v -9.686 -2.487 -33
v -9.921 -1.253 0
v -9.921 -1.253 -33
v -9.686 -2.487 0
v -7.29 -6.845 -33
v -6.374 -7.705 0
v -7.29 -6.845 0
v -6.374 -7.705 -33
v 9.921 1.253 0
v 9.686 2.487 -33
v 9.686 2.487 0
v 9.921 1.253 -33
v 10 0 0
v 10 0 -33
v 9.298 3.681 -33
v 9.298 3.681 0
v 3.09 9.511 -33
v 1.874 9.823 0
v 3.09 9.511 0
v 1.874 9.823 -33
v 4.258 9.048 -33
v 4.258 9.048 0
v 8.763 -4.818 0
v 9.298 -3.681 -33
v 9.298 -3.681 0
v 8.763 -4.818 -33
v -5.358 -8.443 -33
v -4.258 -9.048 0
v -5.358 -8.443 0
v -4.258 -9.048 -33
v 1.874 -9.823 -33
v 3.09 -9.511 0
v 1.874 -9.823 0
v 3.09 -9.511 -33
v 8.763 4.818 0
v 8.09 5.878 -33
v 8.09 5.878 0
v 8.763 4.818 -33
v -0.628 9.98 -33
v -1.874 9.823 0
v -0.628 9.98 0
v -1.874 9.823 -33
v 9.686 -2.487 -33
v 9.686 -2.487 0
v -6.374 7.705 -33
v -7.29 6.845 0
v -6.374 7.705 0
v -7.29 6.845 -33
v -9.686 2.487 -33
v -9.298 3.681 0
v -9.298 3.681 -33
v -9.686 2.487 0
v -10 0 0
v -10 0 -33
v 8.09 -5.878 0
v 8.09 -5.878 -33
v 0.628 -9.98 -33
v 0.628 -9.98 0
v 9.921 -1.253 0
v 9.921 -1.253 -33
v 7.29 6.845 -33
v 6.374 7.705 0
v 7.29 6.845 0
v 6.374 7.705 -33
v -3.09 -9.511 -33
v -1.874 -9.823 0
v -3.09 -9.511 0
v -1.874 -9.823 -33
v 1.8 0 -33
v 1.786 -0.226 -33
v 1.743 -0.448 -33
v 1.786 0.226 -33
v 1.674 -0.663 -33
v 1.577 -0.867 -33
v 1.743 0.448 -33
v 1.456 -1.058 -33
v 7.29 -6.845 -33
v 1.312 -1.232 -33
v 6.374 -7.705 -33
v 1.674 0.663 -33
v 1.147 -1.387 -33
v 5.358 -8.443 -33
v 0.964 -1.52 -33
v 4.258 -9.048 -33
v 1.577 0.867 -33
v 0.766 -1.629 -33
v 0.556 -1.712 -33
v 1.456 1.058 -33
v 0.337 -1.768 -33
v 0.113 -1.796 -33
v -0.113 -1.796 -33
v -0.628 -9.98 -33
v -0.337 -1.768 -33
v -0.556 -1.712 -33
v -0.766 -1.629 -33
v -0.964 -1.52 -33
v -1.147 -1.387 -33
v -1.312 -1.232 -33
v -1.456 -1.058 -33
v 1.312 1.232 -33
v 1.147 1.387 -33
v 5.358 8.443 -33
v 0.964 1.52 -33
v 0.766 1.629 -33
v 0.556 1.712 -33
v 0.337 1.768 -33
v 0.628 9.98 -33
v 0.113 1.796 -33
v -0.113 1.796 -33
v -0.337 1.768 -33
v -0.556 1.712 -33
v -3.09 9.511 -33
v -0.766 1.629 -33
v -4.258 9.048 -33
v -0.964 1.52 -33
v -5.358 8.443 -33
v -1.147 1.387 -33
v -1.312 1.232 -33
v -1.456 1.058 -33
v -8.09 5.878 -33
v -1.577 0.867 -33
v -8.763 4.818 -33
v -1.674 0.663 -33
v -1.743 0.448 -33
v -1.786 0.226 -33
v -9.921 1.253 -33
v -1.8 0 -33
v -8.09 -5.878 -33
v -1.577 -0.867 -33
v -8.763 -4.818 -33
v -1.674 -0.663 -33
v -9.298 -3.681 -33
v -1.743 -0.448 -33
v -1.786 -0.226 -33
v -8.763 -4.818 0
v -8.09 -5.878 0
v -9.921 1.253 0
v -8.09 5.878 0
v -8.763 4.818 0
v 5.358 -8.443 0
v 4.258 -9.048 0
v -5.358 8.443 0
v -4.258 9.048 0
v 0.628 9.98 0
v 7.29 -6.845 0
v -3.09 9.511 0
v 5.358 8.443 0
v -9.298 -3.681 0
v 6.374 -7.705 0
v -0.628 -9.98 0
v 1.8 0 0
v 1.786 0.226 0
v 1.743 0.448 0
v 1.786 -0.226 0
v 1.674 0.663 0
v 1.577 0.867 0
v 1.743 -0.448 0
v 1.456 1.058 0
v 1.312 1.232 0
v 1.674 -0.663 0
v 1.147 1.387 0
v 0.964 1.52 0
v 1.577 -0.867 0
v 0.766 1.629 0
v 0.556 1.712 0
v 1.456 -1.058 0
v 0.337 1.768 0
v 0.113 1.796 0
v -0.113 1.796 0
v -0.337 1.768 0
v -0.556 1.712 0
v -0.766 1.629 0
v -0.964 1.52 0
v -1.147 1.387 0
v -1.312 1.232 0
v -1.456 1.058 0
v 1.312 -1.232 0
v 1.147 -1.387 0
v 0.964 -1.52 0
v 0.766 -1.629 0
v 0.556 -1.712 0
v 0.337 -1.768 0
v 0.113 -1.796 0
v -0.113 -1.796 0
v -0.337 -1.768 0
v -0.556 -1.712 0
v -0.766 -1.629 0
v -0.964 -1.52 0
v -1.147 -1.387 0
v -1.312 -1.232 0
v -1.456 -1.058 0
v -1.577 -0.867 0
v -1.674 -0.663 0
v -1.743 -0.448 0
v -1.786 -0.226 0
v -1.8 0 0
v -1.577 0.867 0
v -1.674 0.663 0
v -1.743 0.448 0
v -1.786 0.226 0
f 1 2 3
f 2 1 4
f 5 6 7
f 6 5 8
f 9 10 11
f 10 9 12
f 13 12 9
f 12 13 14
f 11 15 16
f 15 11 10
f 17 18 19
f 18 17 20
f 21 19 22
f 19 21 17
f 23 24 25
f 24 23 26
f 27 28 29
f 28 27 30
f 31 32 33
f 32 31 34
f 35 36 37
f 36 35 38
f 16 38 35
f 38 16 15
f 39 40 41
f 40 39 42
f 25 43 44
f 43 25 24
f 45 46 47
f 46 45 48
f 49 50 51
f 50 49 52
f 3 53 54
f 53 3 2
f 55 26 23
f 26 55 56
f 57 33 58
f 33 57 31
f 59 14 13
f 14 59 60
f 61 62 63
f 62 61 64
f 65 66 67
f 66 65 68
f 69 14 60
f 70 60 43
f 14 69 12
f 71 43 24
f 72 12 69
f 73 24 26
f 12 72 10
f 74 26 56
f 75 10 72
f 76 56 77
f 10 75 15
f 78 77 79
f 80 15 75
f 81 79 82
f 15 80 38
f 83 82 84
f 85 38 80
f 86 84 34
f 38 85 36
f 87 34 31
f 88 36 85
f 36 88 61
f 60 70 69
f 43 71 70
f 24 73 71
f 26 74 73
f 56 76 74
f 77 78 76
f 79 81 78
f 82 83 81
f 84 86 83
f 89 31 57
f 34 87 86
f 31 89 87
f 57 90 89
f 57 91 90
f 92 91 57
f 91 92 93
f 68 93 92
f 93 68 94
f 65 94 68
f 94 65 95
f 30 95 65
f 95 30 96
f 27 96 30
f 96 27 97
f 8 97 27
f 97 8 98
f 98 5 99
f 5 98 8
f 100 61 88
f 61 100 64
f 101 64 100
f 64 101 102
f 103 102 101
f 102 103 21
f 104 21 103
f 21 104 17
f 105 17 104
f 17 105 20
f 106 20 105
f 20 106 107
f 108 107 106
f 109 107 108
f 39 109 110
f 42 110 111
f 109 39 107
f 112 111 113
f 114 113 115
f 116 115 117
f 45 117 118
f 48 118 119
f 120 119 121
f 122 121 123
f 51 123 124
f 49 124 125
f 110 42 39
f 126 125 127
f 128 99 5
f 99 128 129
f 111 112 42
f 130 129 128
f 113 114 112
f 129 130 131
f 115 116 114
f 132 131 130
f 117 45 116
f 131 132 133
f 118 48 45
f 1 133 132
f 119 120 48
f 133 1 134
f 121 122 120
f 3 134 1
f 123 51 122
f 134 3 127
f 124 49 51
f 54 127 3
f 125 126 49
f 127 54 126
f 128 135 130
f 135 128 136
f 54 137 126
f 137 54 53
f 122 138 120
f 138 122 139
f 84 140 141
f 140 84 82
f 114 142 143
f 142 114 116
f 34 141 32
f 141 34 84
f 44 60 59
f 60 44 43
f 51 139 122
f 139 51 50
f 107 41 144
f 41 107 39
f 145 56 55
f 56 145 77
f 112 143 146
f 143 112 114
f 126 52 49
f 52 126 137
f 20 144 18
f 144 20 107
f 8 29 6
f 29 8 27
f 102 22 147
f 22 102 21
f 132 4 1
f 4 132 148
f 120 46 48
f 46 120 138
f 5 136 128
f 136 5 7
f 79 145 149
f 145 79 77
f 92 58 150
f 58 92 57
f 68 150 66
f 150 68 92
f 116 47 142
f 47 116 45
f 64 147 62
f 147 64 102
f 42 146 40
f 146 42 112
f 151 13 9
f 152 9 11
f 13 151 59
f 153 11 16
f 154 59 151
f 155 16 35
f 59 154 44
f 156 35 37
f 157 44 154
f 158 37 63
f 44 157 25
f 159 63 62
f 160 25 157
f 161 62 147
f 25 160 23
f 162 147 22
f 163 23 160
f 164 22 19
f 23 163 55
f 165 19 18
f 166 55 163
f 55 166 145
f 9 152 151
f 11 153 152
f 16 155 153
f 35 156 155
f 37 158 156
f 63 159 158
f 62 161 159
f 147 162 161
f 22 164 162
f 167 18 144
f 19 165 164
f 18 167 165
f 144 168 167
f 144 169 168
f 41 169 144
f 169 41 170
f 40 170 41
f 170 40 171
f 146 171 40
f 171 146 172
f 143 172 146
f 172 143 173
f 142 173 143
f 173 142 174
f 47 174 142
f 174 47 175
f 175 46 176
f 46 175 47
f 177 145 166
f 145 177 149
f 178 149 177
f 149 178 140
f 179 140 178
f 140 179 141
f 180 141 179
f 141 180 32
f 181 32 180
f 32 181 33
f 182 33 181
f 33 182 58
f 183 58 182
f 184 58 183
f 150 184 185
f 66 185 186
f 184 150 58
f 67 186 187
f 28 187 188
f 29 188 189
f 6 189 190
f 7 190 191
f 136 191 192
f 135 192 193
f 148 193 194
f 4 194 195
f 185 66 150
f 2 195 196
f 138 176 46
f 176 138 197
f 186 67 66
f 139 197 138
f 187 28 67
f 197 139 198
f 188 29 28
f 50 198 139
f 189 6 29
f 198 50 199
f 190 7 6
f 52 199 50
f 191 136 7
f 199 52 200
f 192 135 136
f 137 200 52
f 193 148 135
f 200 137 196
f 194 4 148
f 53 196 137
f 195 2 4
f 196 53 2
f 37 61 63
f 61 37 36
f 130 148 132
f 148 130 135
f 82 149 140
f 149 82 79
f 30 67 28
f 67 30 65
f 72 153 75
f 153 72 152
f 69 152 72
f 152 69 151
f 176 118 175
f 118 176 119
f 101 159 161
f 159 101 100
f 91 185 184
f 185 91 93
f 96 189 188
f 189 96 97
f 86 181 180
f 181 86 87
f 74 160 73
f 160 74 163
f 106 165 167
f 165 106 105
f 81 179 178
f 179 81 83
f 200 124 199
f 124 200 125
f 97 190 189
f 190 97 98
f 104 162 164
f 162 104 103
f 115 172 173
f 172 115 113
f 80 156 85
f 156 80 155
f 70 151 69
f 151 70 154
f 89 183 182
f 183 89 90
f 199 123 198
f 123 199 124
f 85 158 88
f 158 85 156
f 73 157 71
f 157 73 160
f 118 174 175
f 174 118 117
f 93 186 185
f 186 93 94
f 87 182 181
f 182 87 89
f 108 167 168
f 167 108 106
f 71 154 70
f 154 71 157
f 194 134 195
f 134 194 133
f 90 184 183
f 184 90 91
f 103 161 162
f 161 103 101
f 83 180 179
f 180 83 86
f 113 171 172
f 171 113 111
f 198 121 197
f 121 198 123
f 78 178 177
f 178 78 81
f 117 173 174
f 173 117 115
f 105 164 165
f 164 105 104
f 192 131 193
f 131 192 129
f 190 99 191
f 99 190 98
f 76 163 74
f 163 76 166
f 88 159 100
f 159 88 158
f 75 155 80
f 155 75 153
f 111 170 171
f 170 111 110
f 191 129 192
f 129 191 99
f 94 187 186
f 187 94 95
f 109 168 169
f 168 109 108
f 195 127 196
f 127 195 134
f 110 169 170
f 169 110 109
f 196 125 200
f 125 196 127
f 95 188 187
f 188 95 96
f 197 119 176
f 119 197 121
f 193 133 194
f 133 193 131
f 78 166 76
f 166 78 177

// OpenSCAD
$fn = 50;


difference() {
	union() {
		translate(v = [0, 0, -33.0000000000]) {
			cylinder(h = 33, r = 10.0000000000);
		}
		cylinder(h = 0, r = 16.0000000000);
	}
	union() {
		#translate(v = [0, 0, -33]) {
			cylinder(h = 33, r = 1.8000000000);
		}
	}
}
